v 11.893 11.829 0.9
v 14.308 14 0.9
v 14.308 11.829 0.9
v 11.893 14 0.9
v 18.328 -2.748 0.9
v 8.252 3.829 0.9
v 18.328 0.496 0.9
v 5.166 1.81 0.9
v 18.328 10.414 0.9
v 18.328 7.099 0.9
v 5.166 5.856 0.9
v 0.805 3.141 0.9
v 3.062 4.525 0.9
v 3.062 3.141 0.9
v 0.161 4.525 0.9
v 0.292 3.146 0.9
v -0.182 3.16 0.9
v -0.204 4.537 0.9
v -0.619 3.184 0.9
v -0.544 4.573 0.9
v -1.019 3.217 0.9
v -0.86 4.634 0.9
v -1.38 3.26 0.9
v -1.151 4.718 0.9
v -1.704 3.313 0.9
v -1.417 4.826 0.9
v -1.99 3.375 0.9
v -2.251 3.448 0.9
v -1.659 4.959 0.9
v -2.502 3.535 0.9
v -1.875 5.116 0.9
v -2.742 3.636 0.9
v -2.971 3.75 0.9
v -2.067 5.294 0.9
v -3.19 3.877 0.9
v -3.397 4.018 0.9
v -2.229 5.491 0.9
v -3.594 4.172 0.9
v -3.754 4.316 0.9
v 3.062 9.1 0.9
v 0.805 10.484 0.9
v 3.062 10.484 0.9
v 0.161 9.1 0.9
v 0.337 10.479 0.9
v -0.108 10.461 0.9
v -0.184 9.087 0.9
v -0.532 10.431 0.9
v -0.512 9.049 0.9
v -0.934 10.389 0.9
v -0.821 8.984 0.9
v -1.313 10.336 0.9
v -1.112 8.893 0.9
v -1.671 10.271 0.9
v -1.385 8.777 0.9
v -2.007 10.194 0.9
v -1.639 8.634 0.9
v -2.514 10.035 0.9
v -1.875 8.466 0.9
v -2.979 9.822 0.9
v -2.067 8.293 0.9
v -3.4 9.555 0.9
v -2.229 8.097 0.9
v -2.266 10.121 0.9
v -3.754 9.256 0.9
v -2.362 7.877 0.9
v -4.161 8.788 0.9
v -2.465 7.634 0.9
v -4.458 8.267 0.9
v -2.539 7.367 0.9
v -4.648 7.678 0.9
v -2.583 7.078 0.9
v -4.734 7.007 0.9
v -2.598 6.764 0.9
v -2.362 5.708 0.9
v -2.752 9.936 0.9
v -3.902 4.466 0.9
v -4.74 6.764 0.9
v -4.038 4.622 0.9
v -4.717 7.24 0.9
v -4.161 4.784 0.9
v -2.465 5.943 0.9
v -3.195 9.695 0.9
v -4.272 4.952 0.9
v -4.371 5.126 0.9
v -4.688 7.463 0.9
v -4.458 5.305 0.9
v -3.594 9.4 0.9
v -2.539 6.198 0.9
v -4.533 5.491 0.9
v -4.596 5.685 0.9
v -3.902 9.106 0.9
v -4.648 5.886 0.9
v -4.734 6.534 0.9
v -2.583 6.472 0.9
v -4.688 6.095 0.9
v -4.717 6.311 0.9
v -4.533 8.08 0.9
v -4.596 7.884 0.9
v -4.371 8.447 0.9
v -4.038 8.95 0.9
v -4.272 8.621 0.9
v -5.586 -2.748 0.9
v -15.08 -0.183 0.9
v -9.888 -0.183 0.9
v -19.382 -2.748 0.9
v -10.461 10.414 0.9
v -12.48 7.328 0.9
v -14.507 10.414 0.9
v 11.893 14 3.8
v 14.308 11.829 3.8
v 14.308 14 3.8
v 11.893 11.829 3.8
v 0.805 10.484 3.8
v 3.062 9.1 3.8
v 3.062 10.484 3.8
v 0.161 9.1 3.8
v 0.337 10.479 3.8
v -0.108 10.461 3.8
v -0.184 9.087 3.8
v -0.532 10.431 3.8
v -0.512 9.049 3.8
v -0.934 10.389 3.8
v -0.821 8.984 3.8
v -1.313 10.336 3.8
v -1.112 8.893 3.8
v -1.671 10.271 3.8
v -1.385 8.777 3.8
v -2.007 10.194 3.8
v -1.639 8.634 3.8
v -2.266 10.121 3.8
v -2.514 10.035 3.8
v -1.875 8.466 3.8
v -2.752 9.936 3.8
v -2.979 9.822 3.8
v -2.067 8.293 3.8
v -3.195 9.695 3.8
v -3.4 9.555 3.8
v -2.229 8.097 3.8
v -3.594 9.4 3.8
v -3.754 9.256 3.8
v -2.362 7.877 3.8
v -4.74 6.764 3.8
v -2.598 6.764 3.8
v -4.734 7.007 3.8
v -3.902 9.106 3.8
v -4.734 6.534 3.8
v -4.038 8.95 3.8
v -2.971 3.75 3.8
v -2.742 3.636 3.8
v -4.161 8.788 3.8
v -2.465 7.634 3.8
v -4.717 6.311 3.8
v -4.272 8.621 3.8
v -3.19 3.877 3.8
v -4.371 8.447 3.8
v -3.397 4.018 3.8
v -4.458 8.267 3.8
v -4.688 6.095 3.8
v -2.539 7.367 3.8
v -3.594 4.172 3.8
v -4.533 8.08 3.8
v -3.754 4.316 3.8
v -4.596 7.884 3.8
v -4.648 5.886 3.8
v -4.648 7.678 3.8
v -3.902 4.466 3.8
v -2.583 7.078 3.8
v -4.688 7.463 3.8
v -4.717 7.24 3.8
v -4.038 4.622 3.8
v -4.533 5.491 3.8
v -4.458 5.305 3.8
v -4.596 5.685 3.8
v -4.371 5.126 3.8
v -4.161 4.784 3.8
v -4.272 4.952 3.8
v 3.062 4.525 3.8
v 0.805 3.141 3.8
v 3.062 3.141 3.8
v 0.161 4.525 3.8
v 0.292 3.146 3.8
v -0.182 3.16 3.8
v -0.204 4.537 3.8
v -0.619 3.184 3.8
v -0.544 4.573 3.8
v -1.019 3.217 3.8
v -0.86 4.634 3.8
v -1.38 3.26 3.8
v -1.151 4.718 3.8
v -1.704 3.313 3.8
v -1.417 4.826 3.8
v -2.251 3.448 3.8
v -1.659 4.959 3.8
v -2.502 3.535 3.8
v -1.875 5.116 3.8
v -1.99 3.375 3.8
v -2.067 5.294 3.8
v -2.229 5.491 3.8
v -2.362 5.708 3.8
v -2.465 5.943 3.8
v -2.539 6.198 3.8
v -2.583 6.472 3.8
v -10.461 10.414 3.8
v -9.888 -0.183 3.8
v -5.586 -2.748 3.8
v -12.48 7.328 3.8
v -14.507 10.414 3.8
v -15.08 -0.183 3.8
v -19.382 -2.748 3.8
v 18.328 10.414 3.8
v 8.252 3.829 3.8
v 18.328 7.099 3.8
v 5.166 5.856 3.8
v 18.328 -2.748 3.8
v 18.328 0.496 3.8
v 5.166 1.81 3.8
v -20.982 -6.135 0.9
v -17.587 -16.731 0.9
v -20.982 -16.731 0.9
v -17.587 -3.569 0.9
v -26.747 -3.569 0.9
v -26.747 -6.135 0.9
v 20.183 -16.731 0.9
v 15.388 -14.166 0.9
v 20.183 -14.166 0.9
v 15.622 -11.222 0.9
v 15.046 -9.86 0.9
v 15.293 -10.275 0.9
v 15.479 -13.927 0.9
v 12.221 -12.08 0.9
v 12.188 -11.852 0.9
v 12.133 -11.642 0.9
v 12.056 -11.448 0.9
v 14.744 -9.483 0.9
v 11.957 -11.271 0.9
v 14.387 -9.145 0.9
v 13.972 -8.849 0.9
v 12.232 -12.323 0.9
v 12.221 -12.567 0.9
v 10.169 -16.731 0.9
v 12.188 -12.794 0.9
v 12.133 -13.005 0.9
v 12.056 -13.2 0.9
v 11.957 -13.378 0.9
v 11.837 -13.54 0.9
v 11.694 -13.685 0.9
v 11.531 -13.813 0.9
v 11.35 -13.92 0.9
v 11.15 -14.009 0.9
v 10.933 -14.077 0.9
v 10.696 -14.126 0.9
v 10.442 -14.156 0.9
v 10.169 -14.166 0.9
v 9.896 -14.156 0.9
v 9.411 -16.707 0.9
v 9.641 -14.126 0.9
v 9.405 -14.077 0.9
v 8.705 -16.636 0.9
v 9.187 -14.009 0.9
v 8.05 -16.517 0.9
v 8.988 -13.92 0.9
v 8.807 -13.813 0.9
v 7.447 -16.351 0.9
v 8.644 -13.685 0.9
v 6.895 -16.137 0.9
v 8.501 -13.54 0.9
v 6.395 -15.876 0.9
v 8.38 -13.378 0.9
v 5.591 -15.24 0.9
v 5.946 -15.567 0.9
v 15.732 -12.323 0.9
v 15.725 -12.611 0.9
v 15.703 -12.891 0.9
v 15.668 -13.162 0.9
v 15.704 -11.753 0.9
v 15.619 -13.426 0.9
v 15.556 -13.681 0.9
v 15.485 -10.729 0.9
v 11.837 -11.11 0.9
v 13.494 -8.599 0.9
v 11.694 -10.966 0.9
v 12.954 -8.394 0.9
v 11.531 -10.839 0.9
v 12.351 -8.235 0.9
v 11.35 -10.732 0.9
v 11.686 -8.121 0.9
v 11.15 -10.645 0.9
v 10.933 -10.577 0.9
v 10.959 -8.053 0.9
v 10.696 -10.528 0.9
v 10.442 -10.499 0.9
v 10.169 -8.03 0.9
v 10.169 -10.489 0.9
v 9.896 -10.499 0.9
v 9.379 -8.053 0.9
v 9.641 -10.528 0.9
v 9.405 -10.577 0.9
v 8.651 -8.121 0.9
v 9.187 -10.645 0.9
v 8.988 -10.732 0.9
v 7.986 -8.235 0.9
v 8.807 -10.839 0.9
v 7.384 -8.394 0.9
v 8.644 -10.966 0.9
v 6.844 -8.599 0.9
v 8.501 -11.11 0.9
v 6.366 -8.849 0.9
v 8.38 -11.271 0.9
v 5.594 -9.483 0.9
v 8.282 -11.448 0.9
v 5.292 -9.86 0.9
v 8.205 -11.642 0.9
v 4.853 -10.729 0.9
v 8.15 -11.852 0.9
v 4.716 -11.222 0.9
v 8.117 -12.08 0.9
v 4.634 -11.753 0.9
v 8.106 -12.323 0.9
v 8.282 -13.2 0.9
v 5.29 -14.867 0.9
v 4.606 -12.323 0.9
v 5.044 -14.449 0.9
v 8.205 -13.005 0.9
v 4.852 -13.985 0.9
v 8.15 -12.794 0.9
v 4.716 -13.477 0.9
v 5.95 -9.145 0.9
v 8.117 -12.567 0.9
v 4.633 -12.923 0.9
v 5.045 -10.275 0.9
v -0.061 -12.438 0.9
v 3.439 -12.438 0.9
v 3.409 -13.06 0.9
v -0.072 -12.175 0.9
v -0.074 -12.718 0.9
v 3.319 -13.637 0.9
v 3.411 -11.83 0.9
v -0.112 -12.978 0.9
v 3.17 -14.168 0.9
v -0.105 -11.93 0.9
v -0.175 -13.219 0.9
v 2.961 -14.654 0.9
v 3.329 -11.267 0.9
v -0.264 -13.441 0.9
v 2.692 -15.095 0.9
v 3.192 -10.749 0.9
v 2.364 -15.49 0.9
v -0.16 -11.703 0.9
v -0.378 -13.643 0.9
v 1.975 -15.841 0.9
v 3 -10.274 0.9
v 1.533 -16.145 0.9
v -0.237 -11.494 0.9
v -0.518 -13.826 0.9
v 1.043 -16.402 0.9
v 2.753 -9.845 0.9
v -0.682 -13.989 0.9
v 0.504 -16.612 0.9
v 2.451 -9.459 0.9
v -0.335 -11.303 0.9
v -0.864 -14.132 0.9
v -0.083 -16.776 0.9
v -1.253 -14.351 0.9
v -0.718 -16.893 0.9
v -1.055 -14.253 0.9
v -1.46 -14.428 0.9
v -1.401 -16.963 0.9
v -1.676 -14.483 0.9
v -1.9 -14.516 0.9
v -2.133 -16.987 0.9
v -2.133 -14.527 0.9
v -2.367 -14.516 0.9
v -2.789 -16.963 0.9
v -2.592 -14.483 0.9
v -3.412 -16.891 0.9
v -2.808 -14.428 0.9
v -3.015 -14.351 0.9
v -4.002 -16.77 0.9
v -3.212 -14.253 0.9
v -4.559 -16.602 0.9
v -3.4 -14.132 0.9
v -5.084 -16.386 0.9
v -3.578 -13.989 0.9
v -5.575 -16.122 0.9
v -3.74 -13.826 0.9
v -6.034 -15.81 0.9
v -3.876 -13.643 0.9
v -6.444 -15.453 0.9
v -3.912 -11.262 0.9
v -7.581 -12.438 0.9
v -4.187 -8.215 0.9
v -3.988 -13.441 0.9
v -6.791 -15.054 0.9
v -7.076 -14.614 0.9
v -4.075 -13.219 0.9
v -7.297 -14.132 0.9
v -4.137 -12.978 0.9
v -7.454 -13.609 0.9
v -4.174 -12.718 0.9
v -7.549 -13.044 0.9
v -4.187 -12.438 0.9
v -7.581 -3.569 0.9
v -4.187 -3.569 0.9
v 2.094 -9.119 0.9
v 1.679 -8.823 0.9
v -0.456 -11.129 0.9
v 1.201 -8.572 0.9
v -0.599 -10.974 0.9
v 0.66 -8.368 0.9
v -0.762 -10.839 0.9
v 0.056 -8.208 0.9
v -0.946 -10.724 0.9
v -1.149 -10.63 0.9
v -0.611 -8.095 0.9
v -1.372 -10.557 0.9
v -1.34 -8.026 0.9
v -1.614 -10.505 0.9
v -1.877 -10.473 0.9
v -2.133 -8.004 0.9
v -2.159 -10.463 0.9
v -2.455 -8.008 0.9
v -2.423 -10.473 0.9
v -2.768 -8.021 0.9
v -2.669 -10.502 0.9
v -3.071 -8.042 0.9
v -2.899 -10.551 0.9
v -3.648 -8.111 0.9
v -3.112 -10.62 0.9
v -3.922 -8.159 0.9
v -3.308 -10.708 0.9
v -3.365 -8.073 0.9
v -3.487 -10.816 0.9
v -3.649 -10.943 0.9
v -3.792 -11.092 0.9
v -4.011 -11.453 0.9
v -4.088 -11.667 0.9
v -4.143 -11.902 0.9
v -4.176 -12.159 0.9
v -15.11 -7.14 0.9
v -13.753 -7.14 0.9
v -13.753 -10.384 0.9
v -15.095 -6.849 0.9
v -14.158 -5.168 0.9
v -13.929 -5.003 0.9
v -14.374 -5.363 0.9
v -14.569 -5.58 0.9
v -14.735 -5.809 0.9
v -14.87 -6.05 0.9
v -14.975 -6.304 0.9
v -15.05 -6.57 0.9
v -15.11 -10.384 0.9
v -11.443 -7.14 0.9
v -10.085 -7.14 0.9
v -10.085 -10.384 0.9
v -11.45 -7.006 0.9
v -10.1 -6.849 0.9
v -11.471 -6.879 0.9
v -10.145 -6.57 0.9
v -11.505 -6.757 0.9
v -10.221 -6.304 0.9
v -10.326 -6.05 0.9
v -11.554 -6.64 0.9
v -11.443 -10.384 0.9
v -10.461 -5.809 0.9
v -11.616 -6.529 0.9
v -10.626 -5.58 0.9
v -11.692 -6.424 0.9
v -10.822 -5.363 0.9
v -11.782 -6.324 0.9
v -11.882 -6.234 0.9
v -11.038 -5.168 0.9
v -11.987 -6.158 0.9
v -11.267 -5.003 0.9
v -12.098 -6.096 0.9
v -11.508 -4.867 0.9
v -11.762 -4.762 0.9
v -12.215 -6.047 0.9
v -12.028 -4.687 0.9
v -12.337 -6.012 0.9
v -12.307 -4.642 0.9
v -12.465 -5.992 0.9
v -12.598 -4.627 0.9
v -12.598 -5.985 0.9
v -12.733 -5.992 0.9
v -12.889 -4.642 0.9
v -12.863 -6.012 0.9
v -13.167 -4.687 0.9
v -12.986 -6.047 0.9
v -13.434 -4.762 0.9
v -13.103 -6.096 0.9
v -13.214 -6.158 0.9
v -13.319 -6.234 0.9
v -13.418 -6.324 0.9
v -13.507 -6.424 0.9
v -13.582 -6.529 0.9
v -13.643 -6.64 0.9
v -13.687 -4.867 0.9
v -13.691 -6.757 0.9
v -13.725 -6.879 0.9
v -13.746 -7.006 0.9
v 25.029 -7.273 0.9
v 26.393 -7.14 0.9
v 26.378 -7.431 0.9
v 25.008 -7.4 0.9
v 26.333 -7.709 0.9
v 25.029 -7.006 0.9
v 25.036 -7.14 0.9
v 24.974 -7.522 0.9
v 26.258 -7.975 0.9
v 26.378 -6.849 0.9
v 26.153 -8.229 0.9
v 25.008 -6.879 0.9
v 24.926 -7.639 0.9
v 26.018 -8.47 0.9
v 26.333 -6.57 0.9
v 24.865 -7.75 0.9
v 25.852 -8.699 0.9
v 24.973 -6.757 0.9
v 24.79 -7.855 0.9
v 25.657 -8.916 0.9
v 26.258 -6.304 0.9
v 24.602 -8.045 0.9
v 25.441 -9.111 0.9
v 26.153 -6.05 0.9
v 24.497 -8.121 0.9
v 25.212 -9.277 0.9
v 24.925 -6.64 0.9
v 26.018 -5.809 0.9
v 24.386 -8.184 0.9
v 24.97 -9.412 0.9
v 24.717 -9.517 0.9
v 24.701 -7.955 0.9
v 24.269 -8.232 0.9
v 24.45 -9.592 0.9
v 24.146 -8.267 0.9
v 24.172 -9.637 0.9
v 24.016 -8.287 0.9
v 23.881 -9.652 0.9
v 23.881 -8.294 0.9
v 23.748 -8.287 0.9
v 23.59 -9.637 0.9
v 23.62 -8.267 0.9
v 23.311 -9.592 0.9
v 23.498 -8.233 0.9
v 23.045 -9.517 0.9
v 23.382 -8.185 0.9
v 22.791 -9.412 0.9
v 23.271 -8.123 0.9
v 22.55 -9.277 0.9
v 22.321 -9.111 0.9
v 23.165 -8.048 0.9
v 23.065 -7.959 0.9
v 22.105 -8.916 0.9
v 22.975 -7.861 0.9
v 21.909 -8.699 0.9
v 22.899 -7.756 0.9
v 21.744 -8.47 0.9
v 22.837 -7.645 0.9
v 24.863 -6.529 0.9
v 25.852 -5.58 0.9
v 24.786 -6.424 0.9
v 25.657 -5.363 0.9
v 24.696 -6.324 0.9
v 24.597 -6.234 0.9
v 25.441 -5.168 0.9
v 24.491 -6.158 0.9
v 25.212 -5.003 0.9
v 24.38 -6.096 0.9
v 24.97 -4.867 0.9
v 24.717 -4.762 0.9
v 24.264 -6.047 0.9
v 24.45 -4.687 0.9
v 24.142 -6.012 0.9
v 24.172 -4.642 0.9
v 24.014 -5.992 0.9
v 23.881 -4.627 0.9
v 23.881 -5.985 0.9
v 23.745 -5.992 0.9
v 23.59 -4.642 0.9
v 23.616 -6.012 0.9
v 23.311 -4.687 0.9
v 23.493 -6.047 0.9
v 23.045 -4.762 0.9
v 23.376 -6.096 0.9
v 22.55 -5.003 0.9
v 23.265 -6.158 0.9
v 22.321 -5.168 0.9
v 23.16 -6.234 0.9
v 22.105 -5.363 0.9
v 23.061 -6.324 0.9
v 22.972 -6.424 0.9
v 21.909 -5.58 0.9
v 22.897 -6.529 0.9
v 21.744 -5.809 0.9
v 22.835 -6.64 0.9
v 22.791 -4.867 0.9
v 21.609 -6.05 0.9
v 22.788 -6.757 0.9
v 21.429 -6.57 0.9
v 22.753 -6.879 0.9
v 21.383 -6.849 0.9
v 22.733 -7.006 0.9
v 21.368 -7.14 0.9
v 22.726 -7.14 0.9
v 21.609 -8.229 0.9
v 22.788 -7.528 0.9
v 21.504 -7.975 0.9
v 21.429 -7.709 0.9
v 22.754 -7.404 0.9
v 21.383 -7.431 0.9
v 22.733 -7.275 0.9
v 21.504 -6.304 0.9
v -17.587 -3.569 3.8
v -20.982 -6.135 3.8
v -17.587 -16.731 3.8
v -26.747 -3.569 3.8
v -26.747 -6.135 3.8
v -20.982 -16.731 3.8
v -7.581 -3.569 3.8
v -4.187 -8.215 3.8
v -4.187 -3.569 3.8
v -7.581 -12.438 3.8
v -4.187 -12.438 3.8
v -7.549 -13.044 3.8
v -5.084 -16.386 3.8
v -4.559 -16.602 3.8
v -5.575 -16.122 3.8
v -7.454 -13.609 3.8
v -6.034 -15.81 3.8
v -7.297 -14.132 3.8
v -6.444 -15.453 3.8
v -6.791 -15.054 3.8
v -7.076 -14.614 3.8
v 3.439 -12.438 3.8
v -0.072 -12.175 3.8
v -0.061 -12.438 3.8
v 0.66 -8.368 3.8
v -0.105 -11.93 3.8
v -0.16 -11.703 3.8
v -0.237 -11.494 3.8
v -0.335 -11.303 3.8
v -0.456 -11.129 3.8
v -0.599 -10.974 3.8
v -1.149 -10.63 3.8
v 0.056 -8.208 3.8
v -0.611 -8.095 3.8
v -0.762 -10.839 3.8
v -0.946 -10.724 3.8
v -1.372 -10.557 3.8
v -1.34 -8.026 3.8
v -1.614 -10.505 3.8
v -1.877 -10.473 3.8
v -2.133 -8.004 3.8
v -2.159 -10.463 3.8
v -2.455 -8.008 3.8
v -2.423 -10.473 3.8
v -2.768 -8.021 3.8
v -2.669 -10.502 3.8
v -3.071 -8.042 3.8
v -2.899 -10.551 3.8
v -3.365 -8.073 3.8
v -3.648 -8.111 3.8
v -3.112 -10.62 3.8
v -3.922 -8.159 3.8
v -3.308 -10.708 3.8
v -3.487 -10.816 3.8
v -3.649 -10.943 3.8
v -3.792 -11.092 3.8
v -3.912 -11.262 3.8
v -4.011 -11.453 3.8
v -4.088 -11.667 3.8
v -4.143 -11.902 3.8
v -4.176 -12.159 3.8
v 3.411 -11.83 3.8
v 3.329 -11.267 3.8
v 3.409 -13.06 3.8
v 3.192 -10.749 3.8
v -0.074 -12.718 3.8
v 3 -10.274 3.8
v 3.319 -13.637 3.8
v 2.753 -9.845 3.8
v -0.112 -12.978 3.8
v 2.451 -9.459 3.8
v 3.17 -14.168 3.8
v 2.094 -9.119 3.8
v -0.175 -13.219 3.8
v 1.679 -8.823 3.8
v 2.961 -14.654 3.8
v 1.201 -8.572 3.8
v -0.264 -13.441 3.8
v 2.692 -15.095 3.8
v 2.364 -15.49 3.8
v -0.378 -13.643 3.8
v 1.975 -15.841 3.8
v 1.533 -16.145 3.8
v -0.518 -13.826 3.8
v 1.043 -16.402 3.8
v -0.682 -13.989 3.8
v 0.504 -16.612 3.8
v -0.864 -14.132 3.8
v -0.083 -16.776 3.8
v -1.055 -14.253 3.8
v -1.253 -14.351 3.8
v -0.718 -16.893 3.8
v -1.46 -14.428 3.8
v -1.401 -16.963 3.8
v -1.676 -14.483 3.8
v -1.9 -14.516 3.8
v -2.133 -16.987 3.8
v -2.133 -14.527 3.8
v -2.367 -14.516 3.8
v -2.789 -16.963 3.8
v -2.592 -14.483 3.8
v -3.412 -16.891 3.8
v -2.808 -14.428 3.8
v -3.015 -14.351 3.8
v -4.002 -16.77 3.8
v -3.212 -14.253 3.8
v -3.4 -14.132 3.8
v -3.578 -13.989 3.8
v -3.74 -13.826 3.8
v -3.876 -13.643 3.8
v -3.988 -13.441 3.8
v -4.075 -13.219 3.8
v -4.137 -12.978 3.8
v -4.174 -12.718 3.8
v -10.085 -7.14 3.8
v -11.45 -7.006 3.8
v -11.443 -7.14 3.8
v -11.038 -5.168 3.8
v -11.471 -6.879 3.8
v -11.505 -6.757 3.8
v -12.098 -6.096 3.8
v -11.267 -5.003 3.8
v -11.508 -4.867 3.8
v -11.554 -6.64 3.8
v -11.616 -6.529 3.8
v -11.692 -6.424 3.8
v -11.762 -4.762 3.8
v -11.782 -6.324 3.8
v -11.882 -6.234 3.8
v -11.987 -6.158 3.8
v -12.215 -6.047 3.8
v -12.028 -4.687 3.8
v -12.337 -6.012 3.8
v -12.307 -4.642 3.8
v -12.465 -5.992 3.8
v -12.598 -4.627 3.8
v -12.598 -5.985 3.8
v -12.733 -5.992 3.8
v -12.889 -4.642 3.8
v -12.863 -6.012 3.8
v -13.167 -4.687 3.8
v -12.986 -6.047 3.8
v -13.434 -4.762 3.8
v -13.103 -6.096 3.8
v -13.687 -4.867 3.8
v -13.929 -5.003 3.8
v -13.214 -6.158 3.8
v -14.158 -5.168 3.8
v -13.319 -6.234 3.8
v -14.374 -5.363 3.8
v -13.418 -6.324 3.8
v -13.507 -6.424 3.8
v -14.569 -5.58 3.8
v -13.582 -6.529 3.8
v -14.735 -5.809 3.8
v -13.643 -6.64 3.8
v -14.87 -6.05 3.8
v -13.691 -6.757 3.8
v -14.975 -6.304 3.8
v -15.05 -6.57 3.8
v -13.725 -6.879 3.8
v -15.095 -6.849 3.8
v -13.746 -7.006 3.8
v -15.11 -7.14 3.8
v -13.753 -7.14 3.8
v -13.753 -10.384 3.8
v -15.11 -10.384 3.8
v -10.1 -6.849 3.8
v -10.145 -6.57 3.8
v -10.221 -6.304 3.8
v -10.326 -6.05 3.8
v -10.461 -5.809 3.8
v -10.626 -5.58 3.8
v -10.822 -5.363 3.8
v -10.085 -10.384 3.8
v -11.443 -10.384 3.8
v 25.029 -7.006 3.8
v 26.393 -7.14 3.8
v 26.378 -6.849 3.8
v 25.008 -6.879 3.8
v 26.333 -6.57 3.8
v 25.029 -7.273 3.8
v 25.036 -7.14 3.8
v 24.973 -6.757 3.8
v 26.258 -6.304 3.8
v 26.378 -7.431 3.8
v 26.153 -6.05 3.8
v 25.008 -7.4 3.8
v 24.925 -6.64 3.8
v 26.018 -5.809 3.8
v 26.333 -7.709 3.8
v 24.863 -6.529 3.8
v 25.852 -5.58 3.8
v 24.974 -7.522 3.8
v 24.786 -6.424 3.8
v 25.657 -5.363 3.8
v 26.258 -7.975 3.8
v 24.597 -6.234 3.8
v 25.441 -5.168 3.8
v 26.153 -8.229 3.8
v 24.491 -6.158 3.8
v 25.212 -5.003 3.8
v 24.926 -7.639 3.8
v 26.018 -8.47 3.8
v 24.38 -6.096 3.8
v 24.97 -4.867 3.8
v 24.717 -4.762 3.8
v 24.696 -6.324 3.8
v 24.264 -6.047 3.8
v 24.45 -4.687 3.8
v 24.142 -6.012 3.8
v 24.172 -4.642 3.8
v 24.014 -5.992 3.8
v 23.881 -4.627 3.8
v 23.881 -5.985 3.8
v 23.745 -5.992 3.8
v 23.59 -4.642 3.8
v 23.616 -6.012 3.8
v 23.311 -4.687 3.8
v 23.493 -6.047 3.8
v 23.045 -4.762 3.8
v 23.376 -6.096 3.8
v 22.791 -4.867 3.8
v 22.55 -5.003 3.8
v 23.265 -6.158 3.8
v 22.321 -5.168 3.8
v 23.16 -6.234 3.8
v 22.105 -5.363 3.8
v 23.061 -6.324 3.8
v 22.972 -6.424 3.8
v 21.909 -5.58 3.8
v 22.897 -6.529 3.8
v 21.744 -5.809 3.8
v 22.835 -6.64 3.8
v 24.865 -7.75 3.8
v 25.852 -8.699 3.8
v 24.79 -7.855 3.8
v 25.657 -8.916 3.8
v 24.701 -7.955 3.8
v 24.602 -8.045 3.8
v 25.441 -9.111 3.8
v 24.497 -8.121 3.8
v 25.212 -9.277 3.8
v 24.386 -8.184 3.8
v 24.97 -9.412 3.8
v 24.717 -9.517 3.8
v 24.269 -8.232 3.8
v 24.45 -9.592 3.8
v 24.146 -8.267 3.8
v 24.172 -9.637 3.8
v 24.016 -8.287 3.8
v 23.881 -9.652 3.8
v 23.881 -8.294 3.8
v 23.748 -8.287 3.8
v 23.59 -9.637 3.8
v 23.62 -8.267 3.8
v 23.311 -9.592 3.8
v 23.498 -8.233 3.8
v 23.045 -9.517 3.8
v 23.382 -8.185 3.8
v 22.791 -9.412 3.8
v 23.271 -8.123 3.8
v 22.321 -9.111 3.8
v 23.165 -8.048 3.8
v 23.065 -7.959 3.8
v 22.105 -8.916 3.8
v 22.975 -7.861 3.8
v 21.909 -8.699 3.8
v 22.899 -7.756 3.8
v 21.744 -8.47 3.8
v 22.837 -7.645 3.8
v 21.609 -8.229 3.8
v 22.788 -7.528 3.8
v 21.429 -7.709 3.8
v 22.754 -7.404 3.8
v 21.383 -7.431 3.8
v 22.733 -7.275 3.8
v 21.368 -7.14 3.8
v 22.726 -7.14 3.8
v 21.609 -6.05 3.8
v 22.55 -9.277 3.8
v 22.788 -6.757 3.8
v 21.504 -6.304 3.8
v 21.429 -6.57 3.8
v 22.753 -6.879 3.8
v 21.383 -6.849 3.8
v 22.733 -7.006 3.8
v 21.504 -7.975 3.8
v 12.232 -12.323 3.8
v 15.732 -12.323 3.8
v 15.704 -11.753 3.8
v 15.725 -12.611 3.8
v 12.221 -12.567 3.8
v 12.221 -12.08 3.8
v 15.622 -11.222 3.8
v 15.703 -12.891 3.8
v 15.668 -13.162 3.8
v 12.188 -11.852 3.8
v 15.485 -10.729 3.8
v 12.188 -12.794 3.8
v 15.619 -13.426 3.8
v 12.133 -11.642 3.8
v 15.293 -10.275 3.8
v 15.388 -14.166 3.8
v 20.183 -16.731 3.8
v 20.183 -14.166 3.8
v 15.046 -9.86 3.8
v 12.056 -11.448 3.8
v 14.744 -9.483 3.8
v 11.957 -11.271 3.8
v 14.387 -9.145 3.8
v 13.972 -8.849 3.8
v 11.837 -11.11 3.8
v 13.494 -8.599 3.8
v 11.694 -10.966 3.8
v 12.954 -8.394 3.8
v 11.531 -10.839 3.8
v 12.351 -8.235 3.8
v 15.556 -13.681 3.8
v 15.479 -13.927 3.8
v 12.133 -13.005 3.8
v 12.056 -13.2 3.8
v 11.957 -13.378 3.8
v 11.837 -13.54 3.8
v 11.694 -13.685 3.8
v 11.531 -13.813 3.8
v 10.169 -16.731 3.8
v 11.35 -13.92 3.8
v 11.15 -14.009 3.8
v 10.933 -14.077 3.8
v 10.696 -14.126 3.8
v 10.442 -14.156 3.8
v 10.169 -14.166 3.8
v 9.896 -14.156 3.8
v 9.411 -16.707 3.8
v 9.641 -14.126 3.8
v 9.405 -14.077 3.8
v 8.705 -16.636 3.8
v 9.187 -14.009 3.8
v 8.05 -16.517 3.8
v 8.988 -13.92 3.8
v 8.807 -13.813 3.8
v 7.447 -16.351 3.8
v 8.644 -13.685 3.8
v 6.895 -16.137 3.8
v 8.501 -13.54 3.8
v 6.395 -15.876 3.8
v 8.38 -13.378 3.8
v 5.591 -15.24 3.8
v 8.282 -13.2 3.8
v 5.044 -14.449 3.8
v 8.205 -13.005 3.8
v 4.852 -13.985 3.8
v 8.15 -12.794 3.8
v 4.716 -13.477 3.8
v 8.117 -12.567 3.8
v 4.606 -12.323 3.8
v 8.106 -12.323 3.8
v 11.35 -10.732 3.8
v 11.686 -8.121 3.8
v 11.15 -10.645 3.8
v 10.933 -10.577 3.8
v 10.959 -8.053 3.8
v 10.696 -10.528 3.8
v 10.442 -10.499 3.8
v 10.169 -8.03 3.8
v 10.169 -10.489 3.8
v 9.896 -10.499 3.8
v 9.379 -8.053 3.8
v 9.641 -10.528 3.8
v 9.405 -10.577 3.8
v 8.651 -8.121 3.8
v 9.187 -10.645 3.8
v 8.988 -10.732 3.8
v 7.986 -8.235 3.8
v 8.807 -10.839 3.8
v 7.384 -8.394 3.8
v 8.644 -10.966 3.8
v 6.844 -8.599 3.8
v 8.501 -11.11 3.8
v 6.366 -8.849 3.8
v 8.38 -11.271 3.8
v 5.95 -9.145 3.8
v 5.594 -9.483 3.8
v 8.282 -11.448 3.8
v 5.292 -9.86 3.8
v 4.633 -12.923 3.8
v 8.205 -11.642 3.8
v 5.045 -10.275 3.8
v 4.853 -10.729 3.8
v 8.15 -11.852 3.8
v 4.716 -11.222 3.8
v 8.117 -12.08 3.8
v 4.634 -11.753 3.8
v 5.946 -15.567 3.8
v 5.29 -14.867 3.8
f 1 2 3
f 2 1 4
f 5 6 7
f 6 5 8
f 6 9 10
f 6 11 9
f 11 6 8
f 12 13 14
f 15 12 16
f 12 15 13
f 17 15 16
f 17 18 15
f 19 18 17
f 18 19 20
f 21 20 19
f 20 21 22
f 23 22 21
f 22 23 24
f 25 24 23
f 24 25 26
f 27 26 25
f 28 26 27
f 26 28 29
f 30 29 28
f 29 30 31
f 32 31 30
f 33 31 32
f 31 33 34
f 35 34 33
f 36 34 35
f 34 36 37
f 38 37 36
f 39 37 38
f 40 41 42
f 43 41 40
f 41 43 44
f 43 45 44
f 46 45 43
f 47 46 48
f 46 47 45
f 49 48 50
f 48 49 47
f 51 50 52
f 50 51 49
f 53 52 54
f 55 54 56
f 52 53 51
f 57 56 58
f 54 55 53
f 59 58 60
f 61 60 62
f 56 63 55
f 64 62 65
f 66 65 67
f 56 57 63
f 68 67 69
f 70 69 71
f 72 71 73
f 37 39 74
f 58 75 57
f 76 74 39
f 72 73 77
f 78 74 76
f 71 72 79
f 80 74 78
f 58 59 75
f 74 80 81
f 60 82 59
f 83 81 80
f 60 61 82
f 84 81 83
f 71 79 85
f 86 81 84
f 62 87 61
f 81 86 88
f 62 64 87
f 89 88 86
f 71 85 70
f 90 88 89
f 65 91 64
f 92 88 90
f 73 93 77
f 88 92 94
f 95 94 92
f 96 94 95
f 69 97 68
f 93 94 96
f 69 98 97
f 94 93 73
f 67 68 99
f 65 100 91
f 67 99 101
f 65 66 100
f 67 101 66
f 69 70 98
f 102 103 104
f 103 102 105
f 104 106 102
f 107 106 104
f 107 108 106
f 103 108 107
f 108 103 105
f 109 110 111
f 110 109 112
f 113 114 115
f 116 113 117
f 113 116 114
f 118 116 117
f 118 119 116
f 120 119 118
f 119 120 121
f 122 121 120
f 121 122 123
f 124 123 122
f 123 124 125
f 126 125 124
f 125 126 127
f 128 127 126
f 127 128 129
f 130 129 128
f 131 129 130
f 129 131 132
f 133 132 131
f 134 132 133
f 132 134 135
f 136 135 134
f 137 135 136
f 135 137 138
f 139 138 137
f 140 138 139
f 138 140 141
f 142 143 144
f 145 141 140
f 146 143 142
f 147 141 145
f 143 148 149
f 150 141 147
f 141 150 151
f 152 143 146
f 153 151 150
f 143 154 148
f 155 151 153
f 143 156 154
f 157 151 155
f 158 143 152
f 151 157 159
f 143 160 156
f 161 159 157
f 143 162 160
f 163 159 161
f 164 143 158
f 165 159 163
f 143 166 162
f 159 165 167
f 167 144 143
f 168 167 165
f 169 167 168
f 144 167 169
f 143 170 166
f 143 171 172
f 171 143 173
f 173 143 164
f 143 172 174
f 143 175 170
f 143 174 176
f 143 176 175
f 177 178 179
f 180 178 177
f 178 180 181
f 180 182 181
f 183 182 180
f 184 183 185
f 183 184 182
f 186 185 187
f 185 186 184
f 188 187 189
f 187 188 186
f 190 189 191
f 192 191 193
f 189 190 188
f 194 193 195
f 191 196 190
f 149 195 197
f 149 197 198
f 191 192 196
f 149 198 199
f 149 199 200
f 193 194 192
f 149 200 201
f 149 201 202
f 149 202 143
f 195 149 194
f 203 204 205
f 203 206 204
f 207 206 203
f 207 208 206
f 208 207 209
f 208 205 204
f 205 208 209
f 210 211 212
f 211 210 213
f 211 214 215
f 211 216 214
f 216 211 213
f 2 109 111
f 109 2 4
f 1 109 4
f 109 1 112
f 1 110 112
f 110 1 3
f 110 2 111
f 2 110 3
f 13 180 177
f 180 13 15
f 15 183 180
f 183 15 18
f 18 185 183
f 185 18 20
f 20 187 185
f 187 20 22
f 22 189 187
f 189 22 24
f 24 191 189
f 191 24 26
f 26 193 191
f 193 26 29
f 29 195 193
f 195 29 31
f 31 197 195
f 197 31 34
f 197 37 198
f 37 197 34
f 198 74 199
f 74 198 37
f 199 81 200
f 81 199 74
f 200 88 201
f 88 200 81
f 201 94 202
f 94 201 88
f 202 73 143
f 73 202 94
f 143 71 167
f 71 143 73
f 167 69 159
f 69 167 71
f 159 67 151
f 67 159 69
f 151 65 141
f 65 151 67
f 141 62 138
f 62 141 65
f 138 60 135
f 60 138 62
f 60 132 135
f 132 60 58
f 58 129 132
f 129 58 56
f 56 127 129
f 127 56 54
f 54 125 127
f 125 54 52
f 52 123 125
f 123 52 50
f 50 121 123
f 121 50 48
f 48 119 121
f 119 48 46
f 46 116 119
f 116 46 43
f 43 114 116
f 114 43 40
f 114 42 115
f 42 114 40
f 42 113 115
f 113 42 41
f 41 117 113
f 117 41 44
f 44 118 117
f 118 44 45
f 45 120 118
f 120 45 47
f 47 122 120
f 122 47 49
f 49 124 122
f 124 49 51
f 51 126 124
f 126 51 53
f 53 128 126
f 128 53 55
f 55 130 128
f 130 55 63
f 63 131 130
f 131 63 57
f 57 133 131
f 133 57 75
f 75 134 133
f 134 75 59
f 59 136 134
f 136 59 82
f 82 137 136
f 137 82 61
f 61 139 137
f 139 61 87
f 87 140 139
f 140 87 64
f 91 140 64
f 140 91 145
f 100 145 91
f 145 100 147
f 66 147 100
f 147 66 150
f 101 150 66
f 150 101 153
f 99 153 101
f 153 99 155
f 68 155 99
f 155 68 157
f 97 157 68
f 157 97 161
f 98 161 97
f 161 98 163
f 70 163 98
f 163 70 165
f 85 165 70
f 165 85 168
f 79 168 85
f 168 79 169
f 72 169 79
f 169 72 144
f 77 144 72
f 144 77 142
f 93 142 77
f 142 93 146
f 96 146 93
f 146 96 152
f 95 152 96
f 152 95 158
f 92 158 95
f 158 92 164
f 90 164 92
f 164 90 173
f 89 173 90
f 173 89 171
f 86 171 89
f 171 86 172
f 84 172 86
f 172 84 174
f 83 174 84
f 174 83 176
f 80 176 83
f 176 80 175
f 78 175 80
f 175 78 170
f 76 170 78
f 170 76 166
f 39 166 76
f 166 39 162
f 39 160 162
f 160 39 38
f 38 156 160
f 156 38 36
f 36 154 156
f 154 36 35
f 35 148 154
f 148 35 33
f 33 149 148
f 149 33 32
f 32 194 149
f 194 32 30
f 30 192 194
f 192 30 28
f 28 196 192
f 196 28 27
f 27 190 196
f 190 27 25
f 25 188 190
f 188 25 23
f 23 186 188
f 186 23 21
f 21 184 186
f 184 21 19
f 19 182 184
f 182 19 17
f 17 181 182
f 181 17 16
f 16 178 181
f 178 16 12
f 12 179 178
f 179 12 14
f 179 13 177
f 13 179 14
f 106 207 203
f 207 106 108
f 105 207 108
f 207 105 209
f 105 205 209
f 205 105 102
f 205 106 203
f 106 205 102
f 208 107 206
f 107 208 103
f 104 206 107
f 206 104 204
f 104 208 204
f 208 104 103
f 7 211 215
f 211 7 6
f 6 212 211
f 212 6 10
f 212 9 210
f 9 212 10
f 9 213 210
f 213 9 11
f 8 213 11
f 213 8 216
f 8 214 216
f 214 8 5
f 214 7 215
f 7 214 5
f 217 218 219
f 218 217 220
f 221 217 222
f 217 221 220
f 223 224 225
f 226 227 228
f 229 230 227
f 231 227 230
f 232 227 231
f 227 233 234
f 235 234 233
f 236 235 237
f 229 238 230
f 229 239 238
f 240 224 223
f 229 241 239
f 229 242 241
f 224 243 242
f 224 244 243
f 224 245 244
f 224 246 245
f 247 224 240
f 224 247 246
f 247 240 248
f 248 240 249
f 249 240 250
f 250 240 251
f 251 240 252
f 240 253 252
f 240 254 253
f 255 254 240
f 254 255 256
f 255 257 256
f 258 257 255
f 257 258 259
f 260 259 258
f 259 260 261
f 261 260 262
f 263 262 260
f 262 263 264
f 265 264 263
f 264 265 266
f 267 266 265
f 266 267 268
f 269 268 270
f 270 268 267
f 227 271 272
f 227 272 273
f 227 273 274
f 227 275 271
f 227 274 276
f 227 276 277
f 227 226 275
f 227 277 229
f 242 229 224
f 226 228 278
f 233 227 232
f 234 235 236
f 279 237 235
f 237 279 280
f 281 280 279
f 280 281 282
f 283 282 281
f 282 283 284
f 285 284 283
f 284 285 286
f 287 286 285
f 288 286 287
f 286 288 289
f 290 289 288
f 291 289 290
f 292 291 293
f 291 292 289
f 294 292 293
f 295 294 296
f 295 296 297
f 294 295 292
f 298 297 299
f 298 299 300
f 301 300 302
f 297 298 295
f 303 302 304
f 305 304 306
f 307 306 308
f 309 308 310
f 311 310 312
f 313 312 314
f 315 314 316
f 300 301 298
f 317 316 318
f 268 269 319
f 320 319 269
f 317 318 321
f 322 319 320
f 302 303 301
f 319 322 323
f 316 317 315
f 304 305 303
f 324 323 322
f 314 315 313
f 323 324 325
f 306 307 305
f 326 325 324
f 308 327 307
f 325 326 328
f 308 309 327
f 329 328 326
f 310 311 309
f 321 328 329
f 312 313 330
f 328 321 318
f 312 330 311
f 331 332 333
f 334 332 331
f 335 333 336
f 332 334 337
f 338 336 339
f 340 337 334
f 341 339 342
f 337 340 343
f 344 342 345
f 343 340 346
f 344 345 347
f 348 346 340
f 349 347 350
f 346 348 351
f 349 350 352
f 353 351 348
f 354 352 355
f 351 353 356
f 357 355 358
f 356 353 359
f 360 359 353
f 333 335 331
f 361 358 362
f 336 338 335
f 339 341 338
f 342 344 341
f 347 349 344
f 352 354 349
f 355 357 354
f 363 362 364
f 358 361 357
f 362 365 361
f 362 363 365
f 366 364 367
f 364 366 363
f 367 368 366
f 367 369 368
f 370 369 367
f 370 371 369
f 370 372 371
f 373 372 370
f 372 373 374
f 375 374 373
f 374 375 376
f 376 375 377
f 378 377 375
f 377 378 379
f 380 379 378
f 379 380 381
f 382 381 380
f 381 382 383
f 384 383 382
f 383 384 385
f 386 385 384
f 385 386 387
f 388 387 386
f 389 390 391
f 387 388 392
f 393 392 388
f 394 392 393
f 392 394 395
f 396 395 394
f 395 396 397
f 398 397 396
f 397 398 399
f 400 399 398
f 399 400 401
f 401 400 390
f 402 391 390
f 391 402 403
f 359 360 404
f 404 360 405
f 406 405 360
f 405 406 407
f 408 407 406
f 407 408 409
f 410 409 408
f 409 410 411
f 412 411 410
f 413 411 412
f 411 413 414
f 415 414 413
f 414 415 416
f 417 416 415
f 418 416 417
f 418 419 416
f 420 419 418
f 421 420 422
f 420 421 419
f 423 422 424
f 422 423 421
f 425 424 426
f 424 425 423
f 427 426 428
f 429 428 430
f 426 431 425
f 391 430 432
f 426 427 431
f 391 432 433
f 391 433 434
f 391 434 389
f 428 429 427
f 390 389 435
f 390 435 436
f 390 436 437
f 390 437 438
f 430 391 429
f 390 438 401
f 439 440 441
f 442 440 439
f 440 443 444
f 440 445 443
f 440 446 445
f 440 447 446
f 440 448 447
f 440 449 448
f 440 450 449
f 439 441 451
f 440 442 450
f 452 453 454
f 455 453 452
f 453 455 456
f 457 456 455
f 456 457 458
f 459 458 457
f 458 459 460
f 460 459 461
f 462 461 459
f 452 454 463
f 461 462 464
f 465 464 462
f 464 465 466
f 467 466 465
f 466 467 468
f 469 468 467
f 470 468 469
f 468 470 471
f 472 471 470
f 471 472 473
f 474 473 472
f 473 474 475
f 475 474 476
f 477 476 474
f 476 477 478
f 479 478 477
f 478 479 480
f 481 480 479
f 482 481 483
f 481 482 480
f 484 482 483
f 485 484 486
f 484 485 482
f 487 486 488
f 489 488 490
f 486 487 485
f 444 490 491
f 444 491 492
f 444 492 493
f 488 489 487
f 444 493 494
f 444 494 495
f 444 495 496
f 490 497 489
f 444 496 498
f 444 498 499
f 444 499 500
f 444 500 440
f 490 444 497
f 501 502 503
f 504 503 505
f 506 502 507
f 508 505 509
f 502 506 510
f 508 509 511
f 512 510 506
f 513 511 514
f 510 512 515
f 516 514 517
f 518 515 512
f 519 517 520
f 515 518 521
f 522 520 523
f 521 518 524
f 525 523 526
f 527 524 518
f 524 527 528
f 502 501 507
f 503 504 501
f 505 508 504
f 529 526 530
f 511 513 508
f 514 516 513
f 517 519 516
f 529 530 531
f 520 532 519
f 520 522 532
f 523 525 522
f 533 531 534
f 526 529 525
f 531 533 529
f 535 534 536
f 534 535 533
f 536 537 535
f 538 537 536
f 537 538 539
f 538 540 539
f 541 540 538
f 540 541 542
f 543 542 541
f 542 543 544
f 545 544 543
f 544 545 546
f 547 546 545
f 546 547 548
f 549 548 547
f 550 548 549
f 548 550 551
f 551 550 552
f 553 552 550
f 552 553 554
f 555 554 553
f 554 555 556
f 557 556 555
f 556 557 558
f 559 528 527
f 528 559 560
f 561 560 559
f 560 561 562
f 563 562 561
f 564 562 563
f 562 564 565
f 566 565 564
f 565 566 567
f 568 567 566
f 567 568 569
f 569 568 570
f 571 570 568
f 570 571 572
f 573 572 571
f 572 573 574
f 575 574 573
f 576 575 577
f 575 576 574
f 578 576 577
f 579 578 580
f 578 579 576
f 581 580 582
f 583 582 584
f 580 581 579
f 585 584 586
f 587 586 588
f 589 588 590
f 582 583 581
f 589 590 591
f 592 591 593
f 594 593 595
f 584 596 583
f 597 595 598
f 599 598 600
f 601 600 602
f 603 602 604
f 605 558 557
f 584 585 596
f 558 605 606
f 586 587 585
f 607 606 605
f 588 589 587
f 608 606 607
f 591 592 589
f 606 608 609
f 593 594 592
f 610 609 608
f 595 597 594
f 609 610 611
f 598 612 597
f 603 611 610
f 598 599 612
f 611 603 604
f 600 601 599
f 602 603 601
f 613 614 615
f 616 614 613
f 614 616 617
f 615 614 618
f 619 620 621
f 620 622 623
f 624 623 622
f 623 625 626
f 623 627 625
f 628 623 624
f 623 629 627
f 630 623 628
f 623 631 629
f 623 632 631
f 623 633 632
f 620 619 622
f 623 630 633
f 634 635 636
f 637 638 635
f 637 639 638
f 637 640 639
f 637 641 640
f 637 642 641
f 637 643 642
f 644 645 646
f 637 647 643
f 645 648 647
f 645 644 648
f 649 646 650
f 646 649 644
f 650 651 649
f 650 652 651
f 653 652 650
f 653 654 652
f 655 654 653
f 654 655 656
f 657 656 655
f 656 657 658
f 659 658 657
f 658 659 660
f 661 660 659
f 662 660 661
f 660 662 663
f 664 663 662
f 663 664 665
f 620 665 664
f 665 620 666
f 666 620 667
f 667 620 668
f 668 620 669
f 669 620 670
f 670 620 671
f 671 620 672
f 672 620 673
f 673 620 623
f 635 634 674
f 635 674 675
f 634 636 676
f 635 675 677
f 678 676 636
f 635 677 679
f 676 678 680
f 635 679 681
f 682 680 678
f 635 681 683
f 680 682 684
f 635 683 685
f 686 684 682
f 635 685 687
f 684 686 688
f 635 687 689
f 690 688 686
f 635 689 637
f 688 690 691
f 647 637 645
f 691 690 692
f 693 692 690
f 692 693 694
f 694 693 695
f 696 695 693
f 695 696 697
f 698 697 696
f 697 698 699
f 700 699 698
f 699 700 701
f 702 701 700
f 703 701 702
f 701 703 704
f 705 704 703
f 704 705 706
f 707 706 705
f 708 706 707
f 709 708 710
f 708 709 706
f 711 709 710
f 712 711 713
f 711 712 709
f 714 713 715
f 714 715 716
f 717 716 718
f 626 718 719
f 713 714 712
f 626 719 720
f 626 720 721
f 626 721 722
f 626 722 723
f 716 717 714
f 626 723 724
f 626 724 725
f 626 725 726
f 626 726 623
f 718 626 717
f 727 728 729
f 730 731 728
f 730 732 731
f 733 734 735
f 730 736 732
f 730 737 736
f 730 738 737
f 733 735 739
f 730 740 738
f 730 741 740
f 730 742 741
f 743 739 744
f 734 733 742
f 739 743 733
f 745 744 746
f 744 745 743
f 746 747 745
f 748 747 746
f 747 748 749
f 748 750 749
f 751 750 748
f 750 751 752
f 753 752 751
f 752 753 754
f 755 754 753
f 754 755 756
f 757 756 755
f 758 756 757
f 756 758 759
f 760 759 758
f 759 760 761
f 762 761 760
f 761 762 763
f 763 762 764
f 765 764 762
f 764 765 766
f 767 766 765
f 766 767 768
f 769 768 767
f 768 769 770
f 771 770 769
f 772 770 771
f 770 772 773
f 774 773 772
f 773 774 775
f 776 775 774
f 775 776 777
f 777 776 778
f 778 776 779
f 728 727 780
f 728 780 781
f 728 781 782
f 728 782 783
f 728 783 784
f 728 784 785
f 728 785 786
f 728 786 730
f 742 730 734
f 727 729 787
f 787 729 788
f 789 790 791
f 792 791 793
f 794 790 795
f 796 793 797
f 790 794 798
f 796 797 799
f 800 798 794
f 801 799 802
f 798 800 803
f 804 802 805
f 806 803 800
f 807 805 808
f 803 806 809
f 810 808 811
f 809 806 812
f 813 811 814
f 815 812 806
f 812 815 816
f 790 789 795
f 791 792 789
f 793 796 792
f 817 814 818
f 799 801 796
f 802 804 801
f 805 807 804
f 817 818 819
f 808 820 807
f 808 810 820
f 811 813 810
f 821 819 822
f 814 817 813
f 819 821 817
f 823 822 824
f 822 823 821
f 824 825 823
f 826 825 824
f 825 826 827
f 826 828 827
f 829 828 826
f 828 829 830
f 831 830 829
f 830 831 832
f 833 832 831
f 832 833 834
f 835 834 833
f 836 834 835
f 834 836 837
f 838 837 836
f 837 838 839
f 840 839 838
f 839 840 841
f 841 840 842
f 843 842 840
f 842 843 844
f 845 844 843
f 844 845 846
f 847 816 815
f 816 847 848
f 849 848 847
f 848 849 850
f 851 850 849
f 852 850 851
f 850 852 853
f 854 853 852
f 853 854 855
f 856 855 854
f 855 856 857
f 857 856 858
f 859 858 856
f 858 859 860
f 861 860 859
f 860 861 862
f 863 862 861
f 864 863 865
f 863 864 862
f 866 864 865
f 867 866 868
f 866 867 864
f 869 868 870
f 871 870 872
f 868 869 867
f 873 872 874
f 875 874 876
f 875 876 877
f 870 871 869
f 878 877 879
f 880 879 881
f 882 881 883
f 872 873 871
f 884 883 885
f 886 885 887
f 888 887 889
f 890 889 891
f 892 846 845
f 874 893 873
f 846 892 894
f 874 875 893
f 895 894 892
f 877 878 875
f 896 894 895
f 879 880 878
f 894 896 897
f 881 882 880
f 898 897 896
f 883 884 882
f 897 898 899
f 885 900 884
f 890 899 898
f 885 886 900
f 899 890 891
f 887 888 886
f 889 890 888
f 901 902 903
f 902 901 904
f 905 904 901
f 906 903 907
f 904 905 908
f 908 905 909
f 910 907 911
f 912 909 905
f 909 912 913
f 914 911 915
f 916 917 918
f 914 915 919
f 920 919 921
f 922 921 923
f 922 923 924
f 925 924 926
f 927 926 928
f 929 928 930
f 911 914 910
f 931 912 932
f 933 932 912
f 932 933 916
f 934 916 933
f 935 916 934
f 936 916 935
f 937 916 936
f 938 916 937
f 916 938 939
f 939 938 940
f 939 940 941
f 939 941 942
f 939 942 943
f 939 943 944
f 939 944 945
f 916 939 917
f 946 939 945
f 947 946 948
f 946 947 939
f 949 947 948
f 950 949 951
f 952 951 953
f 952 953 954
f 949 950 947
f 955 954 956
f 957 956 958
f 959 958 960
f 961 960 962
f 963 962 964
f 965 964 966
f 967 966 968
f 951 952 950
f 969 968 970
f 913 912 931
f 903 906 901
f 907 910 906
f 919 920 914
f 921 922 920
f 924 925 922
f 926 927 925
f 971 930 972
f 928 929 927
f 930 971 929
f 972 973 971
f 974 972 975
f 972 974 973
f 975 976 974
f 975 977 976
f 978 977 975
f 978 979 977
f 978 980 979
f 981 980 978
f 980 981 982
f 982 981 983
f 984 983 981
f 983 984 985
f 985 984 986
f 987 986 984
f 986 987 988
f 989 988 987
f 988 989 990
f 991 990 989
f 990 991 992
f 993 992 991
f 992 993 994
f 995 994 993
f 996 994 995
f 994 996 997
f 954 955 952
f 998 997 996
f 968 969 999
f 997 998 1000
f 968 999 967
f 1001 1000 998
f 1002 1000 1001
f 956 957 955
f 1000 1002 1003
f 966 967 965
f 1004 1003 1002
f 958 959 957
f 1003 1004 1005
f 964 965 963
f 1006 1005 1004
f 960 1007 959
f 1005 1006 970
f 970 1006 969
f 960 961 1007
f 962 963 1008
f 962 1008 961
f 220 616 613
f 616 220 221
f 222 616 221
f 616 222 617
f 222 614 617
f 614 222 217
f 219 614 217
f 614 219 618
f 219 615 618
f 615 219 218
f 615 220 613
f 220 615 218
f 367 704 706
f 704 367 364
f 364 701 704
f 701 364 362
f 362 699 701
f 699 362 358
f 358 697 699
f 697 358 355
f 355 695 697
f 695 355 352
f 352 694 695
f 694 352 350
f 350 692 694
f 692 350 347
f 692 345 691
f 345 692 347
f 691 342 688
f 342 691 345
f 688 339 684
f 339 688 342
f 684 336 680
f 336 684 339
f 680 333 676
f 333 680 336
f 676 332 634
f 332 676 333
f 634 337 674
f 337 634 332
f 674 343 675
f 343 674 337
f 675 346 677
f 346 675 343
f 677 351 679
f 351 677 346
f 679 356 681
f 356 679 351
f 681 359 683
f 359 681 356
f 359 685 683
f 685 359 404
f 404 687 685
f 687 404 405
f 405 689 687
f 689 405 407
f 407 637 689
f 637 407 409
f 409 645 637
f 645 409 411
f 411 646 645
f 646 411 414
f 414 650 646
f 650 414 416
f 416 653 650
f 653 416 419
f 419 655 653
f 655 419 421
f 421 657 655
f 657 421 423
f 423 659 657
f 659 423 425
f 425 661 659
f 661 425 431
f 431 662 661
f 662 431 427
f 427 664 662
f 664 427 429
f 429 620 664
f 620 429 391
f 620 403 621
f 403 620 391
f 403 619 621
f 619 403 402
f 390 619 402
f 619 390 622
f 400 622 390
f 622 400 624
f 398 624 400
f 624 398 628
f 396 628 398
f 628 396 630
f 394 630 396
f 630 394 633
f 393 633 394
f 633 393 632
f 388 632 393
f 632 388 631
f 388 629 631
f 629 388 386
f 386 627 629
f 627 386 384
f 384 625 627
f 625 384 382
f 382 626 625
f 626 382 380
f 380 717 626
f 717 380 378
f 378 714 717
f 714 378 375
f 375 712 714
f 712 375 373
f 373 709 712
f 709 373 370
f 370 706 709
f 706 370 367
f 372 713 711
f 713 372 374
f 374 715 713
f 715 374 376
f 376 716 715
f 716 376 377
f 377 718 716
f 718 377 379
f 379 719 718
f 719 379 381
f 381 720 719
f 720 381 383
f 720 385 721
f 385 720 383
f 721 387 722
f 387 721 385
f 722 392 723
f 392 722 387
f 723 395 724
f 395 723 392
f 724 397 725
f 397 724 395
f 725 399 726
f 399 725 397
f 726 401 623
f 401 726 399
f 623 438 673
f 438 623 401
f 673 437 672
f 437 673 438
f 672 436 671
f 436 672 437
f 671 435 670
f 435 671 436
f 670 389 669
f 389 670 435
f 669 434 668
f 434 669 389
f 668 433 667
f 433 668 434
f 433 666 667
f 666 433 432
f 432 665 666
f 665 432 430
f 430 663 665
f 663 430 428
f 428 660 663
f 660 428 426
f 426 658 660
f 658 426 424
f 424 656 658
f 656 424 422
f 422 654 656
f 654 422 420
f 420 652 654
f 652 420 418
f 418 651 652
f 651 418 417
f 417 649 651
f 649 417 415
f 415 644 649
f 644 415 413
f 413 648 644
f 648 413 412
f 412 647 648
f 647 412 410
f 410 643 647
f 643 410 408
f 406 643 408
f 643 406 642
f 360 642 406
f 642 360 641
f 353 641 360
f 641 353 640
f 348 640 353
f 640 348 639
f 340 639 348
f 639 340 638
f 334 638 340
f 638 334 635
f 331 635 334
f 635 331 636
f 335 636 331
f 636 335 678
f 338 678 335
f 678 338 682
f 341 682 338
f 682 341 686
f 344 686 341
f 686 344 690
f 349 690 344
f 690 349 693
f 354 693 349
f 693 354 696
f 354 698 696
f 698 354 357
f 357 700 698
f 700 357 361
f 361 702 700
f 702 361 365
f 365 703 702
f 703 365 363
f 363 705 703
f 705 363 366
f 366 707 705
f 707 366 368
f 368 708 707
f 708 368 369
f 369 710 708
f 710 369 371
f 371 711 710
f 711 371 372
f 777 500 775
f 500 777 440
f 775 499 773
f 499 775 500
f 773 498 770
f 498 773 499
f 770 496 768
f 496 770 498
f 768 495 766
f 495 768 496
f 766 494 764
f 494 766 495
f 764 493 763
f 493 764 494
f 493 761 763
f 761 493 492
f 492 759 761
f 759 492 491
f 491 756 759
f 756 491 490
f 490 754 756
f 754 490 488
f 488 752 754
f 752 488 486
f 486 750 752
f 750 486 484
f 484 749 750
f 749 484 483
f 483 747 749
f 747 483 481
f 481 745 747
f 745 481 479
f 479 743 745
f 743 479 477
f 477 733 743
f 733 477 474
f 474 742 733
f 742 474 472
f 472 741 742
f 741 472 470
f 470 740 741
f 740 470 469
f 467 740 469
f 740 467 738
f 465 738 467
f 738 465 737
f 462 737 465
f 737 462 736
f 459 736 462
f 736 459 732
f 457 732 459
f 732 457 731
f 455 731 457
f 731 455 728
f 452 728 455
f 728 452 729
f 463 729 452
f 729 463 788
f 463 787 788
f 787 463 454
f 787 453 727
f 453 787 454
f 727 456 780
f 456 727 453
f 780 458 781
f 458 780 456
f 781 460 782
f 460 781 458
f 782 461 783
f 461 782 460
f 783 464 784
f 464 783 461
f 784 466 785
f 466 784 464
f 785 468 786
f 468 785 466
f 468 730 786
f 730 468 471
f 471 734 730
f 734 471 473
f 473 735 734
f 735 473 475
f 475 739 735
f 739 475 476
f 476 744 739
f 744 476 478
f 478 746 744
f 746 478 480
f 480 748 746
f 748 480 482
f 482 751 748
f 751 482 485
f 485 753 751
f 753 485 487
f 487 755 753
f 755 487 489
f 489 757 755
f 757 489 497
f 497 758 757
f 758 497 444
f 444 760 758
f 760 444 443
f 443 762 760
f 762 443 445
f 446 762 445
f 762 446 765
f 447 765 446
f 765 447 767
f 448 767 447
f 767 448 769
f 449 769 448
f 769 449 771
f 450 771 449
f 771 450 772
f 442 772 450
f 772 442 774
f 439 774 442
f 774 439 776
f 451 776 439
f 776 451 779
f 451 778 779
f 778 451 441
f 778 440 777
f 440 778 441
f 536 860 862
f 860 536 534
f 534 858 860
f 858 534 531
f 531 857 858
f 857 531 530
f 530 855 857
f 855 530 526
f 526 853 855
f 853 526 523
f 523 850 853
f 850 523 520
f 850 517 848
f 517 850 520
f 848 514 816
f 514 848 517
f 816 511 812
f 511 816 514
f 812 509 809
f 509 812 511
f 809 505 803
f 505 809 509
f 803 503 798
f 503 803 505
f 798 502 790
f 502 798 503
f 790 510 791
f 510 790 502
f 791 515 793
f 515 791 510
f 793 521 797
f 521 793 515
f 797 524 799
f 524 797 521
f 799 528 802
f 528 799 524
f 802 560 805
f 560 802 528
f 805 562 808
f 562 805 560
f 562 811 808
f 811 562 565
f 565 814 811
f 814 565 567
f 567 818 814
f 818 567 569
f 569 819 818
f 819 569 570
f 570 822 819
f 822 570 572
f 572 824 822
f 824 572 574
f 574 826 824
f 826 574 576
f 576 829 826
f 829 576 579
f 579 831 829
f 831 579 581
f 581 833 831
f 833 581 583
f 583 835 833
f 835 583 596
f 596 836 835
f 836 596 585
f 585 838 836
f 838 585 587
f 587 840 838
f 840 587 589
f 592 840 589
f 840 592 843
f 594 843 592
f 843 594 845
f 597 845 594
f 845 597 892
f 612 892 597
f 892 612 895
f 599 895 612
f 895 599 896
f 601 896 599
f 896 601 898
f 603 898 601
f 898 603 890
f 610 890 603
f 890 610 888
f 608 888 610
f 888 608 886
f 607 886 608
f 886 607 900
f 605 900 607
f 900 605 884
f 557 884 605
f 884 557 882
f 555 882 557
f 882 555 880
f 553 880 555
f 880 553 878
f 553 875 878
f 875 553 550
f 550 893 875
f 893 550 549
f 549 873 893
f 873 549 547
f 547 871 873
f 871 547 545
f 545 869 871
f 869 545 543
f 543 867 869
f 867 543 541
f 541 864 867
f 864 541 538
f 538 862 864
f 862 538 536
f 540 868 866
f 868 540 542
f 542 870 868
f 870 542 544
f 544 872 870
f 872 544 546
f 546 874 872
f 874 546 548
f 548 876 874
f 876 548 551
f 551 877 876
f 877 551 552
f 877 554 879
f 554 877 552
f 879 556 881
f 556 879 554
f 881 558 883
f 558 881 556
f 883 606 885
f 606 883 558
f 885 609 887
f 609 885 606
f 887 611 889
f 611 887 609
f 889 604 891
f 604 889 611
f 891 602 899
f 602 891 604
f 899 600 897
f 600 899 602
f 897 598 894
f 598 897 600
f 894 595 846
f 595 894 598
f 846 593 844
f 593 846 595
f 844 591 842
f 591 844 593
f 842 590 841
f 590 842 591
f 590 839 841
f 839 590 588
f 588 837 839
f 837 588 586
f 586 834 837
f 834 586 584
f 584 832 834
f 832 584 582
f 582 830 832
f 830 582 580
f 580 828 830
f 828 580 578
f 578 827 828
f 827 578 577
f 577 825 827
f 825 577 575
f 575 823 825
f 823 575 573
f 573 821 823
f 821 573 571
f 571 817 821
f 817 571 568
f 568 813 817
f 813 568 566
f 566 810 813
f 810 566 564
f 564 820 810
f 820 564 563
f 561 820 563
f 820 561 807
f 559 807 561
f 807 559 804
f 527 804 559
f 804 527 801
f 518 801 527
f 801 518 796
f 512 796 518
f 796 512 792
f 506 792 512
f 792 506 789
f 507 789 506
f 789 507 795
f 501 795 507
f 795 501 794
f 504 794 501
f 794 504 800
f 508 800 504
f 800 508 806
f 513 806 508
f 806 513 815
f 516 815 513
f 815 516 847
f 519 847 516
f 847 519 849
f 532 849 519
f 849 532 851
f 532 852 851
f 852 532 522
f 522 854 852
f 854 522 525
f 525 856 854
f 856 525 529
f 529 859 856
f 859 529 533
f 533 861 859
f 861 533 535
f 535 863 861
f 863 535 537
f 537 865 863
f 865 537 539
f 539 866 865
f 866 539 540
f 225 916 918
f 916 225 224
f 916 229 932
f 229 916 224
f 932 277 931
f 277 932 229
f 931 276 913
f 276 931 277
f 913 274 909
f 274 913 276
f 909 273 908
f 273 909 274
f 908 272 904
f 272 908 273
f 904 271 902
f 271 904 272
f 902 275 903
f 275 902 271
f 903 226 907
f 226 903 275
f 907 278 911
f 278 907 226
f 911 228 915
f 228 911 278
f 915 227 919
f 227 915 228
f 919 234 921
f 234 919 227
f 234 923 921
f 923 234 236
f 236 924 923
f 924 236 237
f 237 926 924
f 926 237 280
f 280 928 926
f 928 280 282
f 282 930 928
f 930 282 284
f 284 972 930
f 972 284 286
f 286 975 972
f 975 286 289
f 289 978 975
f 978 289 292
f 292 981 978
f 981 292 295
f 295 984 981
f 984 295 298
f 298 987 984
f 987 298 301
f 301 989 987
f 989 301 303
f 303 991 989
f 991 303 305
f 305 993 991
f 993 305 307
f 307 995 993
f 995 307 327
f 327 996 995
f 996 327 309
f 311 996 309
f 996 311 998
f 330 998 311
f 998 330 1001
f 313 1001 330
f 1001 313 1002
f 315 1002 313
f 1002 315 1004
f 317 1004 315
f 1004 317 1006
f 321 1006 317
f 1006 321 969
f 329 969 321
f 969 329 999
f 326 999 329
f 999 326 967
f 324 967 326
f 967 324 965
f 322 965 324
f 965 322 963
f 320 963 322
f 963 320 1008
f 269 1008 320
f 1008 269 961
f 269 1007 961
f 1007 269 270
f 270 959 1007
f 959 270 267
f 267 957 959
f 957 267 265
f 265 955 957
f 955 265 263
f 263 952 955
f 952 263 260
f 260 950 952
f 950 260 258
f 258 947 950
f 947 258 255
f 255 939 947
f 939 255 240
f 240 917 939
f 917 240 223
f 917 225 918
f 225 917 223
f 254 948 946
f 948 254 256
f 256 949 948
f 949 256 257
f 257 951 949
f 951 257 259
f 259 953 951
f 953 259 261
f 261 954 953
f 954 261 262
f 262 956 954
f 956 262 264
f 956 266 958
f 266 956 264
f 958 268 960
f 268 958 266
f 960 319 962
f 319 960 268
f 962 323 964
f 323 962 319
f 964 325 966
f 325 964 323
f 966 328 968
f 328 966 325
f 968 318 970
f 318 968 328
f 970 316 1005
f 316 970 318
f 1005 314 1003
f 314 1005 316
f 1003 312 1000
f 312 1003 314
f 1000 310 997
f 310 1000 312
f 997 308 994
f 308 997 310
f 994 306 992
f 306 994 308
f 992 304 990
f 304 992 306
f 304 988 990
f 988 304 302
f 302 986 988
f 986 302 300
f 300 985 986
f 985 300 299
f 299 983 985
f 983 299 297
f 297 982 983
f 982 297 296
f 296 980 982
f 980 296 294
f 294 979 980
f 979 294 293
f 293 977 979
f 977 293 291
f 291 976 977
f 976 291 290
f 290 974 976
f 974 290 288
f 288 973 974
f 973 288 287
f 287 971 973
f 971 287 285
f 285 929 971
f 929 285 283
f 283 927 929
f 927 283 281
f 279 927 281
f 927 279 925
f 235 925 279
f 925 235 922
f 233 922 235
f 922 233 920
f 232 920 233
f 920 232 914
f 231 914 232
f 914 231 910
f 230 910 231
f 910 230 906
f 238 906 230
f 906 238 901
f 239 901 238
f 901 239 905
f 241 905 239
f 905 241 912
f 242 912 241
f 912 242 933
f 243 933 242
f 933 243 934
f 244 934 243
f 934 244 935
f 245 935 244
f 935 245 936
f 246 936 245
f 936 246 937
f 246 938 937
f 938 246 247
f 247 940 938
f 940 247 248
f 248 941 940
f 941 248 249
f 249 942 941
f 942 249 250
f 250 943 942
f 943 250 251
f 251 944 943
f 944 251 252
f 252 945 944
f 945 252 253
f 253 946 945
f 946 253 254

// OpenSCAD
$fn = 48;
  // syllabics (overlaid on icon, tallest)
  translate([0, 5.430, 0.900]) linear_extrude(height=2.900) text("ᐃᒼᐹ", size=13.000, halign="center", valign="center", font="Euphemia UCAS:style=Bold");
  translate([0, -10.430, 0.900]) linear_extrude(height=2.900) text("ᒣᐢᑲᓇᐤ", size=13.000, halign="center", valign="center", font="Euphemia UCAS:style=Bold");
